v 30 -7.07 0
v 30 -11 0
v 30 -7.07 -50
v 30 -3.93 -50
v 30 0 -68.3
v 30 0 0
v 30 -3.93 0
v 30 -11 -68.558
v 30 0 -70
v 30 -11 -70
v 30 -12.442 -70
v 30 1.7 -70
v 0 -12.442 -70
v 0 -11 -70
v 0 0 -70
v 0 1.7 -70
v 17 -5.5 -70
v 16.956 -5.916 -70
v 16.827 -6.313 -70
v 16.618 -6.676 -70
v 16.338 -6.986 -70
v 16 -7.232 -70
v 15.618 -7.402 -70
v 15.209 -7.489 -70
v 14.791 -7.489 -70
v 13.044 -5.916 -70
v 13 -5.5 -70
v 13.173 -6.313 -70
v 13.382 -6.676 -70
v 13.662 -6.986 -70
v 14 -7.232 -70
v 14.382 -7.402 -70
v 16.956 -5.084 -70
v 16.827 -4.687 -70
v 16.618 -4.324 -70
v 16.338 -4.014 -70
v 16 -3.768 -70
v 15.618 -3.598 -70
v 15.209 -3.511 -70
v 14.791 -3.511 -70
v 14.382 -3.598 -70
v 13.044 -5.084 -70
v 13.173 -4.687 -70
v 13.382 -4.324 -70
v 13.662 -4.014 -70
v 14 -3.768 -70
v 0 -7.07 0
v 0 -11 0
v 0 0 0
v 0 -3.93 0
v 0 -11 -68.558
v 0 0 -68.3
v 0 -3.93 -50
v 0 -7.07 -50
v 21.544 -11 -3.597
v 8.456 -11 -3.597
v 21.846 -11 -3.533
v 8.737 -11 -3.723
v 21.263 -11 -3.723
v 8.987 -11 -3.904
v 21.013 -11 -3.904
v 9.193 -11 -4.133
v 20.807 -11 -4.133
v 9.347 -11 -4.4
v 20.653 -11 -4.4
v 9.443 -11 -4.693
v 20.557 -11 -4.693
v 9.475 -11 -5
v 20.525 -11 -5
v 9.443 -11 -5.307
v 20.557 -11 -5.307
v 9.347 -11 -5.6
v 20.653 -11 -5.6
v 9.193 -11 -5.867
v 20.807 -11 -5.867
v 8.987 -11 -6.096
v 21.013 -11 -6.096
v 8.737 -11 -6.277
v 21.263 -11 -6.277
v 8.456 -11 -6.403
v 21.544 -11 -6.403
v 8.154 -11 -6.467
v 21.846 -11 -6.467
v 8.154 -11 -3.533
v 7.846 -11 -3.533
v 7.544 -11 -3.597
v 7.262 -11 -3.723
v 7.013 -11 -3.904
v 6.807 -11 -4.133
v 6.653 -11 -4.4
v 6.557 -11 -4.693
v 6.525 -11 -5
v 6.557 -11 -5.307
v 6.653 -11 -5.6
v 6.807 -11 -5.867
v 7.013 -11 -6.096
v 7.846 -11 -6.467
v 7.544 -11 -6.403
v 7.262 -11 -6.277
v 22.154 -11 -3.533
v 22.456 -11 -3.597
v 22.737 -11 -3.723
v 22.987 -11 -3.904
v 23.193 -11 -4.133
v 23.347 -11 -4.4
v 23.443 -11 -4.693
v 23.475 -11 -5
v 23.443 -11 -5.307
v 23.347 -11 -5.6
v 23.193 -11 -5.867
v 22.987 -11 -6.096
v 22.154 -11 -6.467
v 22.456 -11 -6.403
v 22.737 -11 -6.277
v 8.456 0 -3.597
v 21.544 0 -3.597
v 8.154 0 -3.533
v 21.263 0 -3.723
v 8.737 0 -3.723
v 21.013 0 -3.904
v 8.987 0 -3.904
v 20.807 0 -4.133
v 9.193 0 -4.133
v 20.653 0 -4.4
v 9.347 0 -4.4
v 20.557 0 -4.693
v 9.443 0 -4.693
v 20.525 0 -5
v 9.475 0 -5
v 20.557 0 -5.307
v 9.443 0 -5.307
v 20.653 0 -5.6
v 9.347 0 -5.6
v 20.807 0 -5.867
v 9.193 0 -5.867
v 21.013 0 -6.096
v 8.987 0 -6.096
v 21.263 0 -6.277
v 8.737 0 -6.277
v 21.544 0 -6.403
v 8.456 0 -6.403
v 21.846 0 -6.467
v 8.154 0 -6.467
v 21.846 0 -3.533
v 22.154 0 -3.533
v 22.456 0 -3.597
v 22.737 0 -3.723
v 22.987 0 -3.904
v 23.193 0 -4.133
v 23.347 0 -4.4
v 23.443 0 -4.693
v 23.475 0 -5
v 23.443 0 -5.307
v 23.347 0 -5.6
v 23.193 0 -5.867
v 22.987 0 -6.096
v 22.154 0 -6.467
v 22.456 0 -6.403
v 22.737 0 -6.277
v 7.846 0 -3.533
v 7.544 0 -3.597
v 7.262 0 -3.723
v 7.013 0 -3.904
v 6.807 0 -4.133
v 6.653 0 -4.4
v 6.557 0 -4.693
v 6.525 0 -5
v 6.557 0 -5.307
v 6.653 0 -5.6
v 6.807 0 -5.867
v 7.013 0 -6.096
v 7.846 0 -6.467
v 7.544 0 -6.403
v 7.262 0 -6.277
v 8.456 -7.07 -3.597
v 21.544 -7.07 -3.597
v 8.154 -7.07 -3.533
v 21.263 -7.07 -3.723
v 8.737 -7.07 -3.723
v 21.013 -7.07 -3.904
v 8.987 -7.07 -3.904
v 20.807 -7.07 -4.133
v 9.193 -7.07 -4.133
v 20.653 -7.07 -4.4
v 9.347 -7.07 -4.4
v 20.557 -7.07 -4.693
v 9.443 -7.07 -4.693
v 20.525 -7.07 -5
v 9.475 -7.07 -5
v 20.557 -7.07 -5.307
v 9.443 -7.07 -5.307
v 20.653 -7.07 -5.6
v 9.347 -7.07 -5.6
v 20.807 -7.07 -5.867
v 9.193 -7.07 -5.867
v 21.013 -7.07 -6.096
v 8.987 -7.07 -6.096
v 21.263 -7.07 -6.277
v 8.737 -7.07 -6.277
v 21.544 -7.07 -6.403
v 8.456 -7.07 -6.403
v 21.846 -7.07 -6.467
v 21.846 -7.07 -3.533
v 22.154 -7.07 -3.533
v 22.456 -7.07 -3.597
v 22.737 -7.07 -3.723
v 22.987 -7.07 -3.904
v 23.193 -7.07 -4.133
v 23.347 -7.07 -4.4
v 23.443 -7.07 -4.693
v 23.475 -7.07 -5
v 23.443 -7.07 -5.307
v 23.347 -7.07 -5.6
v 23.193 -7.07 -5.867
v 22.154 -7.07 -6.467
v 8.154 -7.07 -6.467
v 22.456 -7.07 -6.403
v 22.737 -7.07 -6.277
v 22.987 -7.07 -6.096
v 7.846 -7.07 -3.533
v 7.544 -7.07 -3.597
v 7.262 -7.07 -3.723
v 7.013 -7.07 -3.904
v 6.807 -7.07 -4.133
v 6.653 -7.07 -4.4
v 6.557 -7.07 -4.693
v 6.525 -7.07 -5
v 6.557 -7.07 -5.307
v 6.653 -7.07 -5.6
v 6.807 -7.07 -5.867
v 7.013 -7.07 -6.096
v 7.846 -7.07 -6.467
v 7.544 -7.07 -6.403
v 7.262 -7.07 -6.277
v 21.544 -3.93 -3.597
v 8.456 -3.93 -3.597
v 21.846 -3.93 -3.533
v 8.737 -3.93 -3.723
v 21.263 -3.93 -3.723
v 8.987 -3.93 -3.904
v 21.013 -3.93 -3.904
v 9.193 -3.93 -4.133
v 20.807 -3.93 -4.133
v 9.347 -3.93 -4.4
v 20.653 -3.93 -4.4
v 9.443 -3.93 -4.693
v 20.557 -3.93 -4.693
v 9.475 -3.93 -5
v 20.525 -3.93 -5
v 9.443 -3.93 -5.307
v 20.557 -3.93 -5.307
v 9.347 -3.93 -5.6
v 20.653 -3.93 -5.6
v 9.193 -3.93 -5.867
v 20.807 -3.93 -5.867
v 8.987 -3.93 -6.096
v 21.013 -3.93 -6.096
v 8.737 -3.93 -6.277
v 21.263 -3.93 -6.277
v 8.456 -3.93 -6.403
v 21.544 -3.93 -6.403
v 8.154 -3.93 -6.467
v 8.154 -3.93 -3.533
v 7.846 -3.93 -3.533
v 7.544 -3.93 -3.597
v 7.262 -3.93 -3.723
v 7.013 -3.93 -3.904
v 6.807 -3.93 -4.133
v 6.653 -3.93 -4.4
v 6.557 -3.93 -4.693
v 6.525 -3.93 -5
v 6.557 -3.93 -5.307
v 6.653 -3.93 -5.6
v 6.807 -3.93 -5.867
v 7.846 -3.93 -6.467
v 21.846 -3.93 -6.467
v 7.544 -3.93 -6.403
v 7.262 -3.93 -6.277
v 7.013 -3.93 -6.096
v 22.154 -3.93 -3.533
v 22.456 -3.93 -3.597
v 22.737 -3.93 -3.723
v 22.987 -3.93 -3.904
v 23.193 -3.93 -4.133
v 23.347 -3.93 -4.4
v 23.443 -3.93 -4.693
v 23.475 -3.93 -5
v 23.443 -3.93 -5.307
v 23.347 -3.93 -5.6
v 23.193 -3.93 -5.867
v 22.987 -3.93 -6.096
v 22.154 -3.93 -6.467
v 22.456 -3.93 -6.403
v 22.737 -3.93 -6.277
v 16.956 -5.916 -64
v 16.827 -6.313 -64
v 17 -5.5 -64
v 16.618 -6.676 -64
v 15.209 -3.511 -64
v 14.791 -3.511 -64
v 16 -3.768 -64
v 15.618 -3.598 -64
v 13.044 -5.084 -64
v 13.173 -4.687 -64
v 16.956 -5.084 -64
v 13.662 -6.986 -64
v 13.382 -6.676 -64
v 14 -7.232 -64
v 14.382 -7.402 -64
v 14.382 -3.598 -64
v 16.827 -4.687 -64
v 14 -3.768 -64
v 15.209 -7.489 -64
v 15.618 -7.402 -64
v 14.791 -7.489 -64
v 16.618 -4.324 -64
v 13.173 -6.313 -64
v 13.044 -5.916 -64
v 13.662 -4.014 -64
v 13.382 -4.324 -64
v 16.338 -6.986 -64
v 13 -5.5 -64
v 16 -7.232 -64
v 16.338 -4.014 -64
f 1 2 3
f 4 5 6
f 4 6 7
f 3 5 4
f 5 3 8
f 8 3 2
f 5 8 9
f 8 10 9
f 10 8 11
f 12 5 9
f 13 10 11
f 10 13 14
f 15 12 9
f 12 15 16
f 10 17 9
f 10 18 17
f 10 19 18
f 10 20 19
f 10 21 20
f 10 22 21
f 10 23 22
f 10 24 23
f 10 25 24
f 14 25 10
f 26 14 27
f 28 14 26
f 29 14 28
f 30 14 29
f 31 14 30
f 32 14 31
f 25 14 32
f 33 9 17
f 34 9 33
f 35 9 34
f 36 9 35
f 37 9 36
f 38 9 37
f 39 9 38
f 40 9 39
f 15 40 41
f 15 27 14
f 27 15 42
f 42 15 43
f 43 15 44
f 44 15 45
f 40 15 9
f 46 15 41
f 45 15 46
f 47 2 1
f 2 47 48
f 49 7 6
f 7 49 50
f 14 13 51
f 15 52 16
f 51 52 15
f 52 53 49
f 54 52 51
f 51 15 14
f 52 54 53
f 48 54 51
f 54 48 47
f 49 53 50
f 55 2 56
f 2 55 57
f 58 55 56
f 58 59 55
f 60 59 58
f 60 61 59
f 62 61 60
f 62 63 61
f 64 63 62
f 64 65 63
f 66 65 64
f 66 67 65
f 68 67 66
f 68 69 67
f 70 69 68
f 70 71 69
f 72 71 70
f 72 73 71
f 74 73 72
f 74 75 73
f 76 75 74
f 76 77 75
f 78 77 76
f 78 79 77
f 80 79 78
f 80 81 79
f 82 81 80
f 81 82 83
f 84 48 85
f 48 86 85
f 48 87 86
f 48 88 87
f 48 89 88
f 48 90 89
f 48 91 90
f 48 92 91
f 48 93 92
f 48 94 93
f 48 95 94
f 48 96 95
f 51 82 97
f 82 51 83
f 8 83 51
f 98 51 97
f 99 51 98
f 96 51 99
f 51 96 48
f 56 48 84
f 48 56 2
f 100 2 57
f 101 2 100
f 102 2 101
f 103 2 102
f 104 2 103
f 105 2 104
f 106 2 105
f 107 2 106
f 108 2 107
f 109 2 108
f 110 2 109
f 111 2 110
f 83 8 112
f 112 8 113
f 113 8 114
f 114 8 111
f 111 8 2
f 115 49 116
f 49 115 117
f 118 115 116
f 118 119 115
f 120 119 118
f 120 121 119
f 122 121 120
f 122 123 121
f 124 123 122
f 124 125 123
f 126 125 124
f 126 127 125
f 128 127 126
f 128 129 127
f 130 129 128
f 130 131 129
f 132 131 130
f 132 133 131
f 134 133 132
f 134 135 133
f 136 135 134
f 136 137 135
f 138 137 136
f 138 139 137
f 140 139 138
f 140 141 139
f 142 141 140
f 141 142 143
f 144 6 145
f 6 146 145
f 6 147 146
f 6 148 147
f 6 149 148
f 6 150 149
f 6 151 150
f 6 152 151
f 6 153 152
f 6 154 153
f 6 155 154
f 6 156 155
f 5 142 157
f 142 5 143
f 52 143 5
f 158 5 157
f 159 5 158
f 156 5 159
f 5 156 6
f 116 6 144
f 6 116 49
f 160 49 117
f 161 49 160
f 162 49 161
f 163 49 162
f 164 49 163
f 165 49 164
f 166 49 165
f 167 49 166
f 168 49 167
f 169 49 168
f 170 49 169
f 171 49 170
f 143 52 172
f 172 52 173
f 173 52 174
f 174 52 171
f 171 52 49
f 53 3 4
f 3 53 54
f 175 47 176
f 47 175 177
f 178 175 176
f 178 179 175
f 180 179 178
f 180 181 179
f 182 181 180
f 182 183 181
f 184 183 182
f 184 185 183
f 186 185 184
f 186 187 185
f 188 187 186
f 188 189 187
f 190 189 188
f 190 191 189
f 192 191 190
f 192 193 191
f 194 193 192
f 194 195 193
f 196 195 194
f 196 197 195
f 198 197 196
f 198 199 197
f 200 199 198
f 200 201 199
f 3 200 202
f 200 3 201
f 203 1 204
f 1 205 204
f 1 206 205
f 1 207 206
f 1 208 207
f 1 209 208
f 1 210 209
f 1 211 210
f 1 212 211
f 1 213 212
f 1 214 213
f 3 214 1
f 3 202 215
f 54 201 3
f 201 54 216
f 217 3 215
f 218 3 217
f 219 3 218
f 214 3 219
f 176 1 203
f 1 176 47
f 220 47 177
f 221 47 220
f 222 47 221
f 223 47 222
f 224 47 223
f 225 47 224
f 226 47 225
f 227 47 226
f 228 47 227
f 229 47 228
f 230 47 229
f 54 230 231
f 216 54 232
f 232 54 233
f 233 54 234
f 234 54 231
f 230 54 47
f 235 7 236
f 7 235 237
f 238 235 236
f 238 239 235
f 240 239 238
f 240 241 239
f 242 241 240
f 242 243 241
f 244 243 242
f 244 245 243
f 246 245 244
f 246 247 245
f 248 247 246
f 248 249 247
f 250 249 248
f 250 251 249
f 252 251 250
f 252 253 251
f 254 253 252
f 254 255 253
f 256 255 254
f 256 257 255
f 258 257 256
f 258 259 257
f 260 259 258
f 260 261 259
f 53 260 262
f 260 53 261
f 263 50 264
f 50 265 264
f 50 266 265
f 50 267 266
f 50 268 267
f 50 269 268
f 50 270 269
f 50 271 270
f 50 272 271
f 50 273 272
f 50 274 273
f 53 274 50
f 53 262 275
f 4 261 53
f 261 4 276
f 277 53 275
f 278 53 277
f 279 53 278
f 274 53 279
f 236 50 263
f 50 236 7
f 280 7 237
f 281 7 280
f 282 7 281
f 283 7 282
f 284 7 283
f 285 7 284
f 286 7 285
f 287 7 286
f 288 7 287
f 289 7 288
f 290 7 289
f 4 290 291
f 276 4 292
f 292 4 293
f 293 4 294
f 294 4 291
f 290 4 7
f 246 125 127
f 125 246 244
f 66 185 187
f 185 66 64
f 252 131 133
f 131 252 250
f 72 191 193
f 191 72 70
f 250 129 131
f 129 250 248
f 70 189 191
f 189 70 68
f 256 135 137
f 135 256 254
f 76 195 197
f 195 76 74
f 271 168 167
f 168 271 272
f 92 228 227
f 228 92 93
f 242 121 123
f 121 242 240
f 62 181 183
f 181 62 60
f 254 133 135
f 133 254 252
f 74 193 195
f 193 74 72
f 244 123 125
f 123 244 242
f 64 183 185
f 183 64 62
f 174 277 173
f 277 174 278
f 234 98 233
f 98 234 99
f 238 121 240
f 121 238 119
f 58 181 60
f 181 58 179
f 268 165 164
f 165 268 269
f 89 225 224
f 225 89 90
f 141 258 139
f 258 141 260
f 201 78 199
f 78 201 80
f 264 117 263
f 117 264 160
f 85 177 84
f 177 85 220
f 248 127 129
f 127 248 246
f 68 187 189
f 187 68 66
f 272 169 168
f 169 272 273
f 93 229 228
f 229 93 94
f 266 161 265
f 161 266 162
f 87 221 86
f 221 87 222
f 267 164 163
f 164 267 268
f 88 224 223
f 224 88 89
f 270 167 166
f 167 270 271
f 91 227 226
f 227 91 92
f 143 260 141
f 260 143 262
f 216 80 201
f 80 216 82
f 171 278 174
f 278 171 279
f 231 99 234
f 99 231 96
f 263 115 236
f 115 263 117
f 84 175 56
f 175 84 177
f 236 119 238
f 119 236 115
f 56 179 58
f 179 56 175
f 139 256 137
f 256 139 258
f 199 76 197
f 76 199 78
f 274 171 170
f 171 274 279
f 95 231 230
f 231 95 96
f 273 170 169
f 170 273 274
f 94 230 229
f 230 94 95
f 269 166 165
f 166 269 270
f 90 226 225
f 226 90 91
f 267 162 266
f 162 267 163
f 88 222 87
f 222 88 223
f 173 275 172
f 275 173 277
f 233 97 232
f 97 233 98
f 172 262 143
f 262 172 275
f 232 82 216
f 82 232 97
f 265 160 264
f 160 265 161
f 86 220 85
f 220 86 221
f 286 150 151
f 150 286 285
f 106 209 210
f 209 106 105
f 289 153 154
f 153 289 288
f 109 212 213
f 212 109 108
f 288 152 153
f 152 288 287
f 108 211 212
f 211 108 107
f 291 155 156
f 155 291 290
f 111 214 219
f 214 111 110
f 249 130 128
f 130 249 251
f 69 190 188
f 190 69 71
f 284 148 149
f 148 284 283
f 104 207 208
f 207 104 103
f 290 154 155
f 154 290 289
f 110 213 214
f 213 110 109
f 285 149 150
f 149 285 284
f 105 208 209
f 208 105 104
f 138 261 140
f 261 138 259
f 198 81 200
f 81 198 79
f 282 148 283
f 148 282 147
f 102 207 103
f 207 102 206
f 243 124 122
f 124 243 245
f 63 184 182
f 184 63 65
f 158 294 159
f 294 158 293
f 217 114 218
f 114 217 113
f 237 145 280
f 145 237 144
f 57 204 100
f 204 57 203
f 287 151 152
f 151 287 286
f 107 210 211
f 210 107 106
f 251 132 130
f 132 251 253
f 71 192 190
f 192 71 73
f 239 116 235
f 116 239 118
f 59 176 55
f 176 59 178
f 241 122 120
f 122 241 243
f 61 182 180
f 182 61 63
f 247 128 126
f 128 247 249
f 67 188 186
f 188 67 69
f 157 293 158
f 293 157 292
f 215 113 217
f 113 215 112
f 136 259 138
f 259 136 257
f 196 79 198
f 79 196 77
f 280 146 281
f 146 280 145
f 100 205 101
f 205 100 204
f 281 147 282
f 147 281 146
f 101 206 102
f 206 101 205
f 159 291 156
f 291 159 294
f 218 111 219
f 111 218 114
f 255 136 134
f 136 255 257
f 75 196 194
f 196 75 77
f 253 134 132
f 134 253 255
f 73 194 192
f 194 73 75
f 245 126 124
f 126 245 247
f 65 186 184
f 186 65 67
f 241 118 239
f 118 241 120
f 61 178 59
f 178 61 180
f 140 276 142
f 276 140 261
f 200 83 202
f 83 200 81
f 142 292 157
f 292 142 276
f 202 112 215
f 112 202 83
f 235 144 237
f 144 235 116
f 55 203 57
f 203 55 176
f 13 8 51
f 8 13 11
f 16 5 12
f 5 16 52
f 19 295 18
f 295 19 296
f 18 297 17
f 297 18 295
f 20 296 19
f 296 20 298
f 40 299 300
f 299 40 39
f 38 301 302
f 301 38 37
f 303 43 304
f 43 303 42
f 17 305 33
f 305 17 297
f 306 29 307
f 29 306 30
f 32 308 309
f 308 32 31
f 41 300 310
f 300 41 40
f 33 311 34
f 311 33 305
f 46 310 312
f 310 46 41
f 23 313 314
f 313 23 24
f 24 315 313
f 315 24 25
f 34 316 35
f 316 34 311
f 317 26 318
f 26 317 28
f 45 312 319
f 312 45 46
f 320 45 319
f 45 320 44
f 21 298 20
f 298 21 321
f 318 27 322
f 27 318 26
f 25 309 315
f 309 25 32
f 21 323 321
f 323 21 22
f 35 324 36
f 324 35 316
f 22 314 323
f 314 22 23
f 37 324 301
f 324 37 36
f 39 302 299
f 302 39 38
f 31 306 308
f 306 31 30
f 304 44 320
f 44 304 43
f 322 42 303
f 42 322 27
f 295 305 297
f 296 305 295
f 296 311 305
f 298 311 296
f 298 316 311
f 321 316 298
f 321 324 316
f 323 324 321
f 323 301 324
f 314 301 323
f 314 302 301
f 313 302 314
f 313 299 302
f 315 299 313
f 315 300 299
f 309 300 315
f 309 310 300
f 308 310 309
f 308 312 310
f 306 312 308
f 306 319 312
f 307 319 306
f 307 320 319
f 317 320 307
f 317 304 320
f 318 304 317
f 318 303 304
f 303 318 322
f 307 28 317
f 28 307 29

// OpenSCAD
$fn = 30;

frame_thickness = 3.14;
plate_holder_thickness = 11;

module m3_hole(l) {
    m3_r = 1.475;
    cylinder(r=m3_r, h=l);
}

module horizontal_m3_hole() {
    translate([0, 60, 0])
        rotate([90, 0, 0])
            m3_hole(60);
}

module polyhedron(w, l) {
    difference() {
        cube([w, w, l]);
        rotate([0, 0 ,45])
            cube([w*2, w*2, l]);
    }
}

module plate_holder() {


        difference() {
            cube([30, plate_holder_thickness, 70]);
            translate([0, (plate_holder_thickness-frame_thickness)/2, 0])
                cube([30, frame_thickness, 50]);
            translate([8, 0, 5])
                horizontal_m3_hole();
            translate([22, 0, 5])
                horizontal_m3_hole();
 
        }

}

rotate([180, 0, 0])
difference() {
    union() {
        plate_holder();
        translate([0, -1.7, 70])
            rotate([0, 90, 0])
                rotate([0, 0, 45])
                    polyhedron(10, 30);
    }
    // xy slot
    translate([30/2, (plate_holder_thickness)/2, 64])
        cylinder(r=2, h=20);
}
